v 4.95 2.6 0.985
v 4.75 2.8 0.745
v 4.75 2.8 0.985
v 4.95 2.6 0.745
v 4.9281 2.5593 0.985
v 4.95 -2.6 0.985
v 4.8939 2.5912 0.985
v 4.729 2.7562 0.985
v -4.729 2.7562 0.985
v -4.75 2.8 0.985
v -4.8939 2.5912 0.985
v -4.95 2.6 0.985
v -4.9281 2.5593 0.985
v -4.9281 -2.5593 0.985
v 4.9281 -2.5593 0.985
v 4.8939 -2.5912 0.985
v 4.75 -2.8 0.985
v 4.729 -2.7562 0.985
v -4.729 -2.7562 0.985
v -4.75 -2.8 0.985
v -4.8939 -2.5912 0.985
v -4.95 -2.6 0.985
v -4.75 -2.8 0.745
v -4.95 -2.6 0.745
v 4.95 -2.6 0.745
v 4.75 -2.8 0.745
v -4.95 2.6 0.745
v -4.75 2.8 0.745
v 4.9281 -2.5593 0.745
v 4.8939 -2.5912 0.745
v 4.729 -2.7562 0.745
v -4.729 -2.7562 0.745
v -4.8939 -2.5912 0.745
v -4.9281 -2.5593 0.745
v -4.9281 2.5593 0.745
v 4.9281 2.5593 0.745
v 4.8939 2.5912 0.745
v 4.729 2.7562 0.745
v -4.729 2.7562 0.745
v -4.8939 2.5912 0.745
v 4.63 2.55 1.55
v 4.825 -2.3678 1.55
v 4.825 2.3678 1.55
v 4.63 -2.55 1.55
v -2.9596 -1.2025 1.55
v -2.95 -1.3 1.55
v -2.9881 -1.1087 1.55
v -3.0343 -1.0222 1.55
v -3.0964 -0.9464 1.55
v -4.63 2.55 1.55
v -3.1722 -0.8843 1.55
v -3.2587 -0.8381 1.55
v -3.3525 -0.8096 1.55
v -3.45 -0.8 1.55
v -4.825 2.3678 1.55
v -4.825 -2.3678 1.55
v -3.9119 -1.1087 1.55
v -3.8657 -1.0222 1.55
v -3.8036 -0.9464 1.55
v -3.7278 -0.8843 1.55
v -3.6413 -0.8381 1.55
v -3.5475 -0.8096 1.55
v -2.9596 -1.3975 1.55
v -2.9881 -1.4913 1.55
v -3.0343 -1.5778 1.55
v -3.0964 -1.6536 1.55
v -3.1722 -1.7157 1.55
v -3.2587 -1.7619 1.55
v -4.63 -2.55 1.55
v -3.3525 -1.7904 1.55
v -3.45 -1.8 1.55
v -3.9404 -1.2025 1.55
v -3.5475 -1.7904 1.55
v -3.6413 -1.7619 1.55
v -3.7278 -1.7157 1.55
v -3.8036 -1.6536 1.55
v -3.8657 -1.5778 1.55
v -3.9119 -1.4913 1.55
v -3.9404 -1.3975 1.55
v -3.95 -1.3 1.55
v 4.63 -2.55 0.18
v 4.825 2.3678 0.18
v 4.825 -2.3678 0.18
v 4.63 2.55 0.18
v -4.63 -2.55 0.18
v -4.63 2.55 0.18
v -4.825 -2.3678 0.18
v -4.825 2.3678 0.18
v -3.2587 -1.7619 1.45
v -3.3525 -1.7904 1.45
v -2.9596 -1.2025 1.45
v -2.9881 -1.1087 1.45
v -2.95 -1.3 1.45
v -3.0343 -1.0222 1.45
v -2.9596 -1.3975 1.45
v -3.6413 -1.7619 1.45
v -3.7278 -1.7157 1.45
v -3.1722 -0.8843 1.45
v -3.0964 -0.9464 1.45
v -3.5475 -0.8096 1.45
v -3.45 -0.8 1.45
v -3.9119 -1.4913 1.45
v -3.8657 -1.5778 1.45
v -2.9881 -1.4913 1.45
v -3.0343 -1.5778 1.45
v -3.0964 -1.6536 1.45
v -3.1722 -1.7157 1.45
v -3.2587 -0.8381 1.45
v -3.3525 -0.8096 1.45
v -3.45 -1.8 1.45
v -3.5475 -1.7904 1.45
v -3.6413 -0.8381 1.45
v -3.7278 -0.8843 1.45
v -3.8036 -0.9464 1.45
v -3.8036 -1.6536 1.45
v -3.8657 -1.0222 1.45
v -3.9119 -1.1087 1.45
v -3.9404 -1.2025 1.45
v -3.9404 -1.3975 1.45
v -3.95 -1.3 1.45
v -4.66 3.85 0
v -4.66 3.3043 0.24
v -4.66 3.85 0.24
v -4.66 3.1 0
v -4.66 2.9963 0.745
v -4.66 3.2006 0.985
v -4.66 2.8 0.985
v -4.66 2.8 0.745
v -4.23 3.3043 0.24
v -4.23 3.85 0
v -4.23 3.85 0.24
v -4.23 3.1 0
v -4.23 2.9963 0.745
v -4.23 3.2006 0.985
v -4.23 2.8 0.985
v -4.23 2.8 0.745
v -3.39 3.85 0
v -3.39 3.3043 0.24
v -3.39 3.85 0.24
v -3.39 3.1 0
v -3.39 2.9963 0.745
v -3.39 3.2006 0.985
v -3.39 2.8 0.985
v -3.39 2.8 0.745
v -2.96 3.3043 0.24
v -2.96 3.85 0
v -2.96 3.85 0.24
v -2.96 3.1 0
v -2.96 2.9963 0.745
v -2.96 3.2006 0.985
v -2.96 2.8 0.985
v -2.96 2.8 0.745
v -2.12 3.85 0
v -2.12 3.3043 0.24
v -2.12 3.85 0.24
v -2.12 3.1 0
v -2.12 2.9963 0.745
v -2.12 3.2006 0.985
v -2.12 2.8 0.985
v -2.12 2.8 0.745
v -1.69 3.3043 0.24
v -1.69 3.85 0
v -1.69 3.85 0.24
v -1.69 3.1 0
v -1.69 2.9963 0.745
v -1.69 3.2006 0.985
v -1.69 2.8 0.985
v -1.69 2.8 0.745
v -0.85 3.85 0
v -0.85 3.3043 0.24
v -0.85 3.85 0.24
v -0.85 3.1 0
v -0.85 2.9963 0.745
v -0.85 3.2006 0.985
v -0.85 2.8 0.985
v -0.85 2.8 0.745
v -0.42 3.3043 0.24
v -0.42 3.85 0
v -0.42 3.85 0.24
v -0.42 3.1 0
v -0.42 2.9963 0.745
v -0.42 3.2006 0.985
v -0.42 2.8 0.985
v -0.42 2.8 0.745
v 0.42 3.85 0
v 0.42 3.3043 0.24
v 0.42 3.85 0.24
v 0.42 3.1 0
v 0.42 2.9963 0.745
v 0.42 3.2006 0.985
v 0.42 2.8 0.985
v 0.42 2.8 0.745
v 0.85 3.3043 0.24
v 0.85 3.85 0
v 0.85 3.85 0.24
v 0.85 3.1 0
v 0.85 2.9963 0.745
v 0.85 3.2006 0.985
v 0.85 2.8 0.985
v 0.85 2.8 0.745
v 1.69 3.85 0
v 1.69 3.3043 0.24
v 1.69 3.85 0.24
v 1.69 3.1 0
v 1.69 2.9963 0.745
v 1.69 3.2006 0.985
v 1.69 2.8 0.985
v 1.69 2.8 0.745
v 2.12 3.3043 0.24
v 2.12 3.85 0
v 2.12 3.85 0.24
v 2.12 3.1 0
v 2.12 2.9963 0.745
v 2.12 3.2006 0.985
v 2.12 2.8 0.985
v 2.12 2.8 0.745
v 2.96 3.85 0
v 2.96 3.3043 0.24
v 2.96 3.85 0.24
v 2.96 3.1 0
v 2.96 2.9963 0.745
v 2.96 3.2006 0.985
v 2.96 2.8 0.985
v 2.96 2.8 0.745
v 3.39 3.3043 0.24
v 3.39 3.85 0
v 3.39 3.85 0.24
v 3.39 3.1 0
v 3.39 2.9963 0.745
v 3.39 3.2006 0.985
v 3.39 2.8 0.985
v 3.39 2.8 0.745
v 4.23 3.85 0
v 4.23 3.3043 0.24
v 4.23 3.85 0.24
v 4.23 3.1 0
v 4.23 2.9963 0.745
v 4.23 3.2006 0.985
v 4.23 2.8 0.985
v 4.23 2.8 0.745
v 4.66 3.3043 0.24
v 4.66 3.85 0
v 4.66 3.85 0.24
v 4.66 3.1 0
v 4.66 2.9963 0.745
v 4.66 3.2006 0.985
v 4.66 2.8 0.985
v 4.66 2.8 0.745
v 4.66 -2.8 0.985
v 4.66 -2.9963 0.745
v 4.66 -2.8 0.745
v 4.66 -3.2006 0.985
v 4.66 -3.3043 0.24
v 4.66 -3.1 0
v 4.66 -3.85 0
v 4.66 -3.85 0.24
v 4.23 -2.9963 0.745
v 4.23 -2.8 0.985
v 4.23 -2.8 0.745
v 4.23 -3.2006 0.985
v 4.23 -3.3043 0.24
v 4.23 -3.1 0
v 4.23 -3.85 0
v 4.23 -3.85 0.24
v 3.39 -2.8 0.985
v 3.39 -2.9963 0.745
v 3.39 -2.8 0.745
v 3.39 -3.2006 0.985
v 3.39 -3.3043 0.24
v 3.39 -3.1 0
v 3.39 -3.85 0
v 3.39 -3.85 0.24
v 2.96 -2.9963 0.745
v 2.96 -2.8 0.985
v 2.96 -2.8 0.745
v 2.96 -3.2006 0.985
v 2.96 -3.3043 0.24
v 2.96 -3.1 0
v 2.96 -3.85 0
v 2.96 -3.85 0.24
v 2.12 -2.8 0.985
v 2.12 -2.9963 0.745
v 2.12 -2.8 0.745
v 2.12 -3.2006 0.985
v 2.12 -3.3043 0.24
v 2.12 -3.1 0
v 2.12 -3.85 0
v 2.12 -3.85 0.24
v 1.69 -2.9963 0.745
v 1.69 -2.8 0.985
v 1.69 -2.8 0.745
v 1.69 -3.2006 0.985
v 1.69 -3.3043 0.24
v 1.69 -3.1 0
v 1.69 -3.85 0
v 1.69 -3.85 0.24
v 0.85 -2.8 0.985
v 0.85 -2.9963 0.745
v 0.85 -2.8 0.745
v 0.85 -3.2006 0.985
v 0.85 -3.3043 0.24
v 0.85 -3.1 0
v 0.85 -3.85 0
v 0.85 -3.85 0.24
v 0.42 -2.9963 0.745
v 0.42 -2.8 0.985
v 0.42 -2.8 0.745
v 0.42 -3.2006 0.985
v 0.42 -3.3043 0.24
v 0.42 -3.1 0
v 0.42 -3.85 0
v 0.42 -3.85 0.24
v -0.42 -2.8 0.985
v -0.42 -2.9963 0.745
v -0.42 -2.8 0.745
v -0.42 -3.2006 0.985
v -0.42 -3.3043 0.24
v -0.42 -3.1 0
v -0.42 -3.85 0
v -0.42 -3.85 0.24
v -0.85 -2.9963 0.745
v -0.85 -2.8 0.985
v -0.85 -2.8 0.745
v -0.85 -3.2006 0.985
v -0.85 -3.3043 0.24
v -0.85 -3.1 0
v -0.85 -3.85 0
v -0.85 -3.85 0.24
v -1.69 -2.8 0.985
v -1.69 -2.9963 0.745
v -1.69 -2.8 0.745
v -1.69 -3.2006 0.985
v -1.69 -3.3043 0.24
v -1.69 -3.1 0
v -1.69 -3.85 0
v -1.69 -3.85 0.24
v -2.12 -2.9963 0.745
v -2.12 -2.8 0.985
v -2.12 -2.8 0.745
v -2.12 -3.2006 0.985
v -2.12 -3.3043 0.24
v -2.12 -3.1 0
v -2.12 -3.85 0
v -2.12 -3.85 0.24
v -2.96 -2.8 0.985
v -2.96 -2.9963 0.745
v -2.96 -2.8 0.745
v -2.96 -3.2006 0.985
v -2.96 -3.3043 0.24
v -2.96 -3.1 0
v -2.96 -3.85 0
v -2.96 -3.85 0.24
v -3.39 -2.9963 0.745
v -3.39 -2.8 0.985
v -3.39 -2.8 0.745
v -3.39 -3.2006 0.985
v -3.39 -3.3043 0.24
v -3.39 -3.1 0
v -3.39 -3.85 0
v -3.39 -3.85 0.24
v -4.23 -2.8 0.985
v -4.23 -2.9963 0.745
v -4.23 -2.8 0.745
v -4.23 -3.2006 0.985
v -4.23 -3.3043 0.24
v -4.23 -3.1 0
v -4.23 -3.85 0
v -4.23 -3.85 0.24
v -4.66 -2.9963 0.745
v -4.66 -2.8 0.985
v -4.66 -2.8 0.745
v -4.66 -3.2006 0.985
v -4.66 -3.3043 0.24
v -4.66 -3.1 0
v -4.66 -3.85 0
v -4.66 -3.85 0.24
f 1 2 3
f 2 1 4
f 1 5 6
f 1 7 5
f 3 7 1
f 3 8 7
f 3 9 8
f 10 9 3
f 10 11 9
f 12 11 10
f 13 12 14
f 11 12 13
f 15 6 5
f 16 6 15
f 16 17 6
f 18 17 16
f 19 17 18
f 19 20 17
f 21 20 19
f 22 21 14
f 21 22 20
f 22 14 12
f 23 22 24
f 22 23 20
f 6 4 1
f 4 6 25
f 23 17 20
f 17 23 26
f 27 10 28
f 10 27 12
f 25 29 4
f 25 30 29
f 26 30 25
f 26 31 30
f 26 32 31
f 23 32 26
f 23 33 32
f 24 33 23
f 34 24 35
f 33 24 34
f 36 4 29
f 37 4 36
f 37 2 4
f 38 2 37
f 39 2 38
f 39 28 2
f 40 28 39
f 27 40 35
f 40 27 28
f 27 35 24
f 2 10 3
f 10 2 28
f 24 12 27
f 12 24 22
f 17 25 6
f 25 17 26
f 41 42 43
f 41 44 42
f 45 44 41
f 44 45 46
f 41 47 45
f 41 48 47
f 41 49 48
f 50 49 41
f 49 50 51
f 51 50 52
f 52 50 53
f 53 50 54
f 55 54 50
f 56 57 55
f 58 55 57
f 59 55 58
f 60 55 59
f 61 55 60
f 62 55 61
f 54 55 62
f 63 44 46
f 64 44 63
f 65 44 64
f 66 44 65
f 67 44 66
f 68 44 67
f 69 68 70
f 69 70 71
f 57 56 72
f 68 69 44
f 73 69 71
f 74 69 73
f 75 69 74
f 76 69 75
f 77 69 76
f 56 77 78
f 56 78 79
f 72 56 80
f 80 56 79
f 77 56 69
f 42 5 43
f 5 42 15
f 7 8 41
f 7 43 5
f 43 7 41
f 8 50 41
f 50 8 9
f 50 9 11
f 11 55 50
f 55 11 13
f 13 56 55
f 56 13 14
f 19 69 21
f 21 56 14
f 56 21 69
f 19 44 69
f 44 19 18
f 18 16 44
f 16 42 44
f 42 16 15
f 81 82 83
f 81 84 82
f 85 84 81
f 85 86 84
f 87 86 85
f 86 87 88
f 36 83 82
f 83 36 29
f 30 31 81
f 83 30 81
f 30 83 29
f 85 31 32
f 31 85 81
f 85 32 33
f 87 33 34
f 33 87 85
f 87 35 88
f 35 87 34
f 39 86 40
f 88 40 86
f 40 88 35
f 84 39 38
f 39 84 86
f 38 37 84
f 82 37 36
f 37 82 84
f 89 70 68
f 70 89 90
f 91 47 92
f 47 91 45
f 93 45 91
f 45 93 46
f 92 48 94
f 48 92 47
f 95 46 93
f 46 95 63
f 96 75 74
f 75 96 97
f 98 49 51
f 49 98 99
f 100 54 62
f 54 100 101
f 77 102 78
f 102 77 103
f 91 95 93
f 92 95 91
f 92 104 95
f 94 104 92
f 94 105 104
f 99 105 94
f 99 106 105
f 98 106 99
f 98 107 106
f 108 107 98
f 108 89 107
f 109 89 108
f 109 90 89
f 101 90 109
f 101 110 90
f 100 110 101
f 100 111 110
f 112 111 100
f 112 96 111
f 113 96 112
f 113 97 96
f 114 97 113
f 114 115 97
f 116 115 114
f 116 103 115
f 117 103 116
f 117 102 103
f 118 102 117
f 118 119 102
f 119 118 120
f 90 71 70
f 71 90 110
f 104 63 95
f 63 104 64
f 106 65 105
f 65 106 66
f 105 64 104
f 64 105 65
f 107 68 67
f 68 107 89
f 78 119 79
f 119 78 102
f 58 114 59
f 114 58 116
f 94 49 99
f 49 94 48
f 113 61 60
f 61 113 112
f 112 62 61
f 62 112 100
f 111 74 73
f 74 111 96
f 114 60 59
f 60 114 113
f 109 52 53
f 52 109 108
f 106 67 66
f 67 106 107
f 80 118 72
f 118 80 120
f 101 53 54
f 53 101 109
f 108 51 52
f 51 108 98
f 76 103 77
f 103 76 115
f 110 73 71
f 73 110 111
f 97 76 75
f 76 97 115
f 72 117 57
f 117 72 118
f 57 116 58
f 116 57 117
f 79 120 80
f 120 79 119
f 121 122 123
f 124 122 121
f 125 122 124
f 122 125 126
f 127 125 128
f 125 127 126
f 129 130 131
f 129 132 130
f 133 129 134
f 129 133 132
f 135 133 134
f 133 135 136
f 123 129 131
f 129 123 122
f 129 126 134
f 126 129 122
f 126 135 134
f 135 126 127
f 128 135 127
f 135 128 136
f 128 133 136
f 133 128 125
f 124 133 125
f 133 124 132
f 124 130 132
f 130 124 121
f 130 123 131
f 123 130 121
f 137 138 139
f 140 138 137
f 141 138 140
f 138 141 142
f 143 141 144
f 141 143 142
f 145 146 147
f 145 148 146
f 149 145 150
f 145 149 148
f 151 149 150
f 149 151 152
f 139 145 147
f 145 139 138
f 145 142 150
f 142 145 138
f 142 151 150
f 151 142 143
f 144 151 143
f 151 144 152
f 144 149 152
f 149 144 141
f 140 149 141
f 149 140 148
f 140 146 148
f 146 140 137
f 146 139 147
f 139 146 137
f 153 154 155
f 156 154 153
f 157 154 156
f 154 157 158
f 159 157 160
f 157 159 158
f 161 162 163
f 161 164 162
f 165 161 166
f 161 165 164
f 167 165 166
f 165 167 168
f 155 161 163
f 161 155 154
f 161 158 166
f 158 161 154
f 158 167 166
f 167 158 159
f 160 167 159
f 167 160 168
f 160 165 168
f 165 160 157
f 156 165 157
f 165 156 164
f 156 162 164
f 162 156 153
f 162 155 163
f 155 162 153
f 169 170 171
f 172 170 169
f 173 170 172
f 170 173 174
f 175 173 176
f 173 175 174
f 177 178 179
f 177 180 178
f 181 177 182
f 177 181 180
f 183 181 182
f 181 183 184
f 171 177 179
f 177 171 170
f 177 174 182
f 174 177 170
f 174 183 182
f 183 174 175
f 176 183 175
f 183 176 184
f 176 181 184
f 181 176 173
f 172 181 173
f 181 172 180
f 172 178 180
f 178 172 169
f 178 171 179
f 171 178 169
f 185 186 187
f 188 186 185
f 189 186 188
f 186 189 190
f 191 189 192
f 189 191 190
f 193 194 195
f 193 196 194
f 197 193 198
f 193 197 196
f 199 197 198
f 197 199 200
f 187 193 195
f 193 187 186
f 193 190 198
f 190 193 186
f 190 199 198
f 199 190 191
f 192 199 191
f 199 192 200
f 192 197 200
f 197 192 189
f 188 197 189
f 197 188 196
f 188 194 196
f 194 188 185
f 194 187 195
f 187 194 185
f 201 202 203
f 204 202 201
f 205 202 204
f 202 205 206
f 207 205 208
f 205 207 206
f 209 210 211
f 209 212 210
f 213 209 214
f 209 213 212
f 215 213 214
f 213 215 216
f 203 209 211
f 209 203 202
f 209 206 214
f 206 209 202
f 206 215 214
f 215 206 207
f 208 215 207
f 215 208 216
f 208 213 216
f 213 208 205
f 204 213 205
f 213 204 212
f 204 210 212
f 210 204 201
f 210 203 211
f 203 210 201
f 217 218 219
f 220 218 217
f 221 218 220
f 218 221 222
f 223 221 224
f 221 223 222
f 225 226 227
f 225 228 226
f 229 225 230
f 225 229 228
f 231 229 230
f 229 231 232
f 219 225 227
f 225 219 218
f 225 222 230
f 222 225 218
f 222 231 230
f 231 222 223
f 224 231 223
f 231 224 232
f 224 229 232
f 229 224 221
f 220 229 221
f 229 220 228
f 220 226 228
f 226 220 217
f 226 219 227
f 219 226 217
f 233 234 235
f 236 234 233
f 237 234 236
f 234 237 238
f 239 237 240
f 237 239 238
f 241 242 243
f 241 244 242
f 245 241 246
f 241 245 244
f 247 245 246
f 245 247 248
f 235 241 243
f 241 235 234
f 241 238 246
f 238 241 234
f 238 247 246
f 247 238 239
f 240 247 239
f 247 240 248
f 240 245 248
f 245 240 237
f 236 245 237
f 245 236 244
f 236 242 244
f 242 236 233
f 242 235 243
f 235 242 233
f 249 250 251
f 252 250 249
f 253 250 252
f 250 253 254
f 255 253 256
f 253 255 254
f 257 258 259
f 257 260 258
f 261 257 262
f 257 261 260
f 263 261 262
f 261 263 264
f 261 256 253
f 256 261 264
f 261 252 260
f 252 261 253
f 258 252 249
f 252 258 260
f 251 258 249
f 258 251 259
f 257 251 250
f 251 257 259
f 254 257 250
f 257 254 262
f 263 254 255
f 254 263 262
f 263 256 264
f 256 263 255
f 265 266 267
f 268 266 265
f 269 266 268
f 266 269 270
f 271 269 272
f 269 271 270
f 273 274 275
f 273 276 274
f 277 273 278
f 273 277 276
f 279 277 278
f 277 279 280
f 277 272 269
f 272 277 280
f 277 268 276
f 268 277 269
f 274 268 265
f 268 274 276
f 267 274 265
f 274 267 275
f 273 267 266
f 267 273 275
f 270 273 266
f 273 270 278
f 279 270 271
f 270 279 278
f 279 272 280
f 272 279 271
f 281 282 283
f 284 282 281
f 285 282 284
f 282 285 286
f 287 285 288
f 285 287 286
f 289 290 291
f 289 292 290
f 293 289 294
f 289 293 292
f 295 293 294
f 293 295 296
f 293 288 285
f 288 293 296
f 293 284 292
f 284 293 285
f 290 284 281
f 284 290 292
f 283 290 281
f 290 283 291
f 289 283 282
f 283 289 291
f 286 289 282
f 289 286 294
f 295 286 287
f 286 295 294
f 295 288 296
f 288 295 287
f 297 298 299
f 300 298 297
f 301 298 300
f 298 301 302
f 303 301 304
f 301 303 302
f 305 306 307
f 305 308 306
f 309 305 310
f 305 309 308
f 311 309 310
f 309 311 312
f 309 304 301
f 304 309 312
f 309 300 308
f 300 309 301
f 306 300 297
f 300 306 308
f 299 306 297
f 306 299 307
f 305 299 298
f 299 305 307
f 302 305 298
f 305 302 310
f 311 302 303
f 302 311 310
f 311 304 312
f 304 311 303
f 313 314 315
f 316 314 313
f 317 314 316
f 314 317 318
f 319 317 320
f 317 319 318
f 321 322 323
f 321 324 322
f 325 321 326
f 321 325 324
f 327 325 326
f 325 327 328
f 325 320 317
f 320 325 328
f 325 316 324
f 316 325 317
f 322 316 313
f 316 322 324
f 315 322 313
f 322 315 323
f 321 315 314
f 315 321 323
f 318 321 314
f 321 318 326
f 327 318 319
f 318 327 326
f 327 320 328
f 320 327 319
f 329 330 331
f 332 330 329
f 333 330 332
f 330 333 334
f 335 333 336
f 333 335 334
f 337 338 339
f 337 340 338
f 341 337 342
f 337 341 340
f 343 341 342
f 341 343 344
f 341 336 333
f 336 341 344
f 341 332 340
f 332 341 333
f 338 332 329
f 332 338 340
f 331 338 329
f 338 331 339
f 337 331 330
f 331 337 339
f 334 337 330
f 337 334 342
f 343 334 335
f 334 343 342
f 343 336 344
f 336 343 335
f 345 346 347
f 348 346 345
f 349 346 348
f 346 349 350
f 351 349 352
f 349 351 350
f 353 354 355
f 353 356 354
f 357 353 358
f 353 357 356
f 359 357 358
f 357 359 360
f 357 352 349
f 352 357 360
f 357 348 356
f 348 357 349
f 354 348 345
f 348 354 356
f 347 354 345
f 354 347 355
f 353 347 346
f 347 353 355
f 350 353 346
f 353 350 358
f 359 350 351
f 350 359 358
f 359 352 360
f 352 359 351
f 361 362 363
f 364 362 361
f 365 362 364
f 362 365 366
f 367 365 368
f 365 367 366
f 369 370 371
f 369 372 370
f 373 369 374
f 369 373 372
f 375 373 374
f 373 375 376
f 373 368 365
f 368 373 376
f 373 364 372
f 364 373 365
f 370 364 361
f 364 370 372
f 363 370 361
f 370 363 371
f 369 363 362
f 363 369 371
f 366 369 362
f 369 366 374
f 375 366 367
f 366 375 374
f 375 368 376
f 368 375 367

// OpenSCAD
pins = 16;
pin_pitch = 1.27;
pin_width = 0.43;
pin_seating = 0.75;
pin_gull_angle = 8;
leadframe_thickness = 0.24;

overall_width = 7.7;
body_width = 5.6;
body_length = 9.9;
body_thickness = 1.37;

total_thickness = 1.55;

body_length_bevel = 0.25;
body_width_bevel = 0.5;
body_chamfer = 0.2;


leadframe_height = total_thickness - body_thickness/2;

index_mark_offset = min(min(body_width, body_length) * 0.3, 1.5);
index_mark_radius = min(index_mark_offset / 3, 0.5);


difference() {
    body();
    color("#753") translate([
        -body_length / 2 + index_mark_offset,
        -body_width / 2 + index_mark_offset,
        total_thickness - 0.1,
    ]) cylinder(h = 10, r = index_mark_radius, $fn=32);
}


translate([pin_pitch * ((pins / 2) - 1) / -2, overall_width / 2, 0]) for(n = [0 : pins / 2 - 1]) {
    translate([pin_pitch * n, 0, 0]) pin();
}
rotate([0, 0, 180]) translate([pin_pitch * ((pins / 2) - 1) / -2, overall_width / 2, 0]) for(n = [0 : pins / 2 - 1]) {
    translate([pin_pitch * n, 0, 0]) pin();
}


module pin() {
    color("#999") rotate([90, 0, 90]) linear_extrude(height = pin_width, center = true) {
        gull_offset = leadframe_height - leadframe_thickness / 2;
        pin_length = (overall_width - body_width) / 2;
        sine = sin(pin_gull_angle);
        cosine = cos(pin_gull_angle);
        polygon([
            [0, 0],
            [-pin_seating, 0],
            [-pin_seating - sine * gull_offset, gull_offset],
            [-pin_length, gull_offset],
            [-pin_length, gull_offset + leadframe_thickness],
            [-pin_seating - sine * (gull_offset + leadframe_thickness) + cosine * leadframe_thickness, gull_offset + leadframe_thickness],
            [-pin_seating - sine * leadframe_thickness + cosine * leadframe_thickness, leadframe_thickness],
            [0, leadframe_thickness],
        ]);
    }
}


module body() {
    color("#da4") translate([0, 0, leadframe_height]) {
        linear_extrude(height = leadframe_thickness, center = true) body_outline();
        linear_extrude(
            height = body_thickness / 2,
            scale = [(body_length - body_length_bevel) / body_length, (body_width - body_width_bevel) / body_width]
        ) body_outline();
        
        rotate([180, 0, 0]) linear_extrude(
            height = body_thickness / 2,
            scale = [(body_length - body_length_bevel) / body_length, (body_width - body_width_bevel) / body_width]
        ) body_outline();
    }
}
module body_outline() {
    polygon([
        [ -body_length/2 + body_chamfer, -body_width/2 ],
        [ -body_length/2               , -body_width/2 + body_chamfer ],
        [ -body_length/2               , +body_width/2 - body_chamfer ],
        [ -body_length/2 + body_chamfer, +body_width/2 ],
        [ +body_length/2 - body_chamfer, +body_width/2 ],
        [ +body_length/2               , +body_width/2 - body_chamfer ],
        [ +body_length/2               , -body_width/2 + body_chamfer ],
        [ +body_length/2 - body_chamfer, -body_width/2 ],
    ]);
}
